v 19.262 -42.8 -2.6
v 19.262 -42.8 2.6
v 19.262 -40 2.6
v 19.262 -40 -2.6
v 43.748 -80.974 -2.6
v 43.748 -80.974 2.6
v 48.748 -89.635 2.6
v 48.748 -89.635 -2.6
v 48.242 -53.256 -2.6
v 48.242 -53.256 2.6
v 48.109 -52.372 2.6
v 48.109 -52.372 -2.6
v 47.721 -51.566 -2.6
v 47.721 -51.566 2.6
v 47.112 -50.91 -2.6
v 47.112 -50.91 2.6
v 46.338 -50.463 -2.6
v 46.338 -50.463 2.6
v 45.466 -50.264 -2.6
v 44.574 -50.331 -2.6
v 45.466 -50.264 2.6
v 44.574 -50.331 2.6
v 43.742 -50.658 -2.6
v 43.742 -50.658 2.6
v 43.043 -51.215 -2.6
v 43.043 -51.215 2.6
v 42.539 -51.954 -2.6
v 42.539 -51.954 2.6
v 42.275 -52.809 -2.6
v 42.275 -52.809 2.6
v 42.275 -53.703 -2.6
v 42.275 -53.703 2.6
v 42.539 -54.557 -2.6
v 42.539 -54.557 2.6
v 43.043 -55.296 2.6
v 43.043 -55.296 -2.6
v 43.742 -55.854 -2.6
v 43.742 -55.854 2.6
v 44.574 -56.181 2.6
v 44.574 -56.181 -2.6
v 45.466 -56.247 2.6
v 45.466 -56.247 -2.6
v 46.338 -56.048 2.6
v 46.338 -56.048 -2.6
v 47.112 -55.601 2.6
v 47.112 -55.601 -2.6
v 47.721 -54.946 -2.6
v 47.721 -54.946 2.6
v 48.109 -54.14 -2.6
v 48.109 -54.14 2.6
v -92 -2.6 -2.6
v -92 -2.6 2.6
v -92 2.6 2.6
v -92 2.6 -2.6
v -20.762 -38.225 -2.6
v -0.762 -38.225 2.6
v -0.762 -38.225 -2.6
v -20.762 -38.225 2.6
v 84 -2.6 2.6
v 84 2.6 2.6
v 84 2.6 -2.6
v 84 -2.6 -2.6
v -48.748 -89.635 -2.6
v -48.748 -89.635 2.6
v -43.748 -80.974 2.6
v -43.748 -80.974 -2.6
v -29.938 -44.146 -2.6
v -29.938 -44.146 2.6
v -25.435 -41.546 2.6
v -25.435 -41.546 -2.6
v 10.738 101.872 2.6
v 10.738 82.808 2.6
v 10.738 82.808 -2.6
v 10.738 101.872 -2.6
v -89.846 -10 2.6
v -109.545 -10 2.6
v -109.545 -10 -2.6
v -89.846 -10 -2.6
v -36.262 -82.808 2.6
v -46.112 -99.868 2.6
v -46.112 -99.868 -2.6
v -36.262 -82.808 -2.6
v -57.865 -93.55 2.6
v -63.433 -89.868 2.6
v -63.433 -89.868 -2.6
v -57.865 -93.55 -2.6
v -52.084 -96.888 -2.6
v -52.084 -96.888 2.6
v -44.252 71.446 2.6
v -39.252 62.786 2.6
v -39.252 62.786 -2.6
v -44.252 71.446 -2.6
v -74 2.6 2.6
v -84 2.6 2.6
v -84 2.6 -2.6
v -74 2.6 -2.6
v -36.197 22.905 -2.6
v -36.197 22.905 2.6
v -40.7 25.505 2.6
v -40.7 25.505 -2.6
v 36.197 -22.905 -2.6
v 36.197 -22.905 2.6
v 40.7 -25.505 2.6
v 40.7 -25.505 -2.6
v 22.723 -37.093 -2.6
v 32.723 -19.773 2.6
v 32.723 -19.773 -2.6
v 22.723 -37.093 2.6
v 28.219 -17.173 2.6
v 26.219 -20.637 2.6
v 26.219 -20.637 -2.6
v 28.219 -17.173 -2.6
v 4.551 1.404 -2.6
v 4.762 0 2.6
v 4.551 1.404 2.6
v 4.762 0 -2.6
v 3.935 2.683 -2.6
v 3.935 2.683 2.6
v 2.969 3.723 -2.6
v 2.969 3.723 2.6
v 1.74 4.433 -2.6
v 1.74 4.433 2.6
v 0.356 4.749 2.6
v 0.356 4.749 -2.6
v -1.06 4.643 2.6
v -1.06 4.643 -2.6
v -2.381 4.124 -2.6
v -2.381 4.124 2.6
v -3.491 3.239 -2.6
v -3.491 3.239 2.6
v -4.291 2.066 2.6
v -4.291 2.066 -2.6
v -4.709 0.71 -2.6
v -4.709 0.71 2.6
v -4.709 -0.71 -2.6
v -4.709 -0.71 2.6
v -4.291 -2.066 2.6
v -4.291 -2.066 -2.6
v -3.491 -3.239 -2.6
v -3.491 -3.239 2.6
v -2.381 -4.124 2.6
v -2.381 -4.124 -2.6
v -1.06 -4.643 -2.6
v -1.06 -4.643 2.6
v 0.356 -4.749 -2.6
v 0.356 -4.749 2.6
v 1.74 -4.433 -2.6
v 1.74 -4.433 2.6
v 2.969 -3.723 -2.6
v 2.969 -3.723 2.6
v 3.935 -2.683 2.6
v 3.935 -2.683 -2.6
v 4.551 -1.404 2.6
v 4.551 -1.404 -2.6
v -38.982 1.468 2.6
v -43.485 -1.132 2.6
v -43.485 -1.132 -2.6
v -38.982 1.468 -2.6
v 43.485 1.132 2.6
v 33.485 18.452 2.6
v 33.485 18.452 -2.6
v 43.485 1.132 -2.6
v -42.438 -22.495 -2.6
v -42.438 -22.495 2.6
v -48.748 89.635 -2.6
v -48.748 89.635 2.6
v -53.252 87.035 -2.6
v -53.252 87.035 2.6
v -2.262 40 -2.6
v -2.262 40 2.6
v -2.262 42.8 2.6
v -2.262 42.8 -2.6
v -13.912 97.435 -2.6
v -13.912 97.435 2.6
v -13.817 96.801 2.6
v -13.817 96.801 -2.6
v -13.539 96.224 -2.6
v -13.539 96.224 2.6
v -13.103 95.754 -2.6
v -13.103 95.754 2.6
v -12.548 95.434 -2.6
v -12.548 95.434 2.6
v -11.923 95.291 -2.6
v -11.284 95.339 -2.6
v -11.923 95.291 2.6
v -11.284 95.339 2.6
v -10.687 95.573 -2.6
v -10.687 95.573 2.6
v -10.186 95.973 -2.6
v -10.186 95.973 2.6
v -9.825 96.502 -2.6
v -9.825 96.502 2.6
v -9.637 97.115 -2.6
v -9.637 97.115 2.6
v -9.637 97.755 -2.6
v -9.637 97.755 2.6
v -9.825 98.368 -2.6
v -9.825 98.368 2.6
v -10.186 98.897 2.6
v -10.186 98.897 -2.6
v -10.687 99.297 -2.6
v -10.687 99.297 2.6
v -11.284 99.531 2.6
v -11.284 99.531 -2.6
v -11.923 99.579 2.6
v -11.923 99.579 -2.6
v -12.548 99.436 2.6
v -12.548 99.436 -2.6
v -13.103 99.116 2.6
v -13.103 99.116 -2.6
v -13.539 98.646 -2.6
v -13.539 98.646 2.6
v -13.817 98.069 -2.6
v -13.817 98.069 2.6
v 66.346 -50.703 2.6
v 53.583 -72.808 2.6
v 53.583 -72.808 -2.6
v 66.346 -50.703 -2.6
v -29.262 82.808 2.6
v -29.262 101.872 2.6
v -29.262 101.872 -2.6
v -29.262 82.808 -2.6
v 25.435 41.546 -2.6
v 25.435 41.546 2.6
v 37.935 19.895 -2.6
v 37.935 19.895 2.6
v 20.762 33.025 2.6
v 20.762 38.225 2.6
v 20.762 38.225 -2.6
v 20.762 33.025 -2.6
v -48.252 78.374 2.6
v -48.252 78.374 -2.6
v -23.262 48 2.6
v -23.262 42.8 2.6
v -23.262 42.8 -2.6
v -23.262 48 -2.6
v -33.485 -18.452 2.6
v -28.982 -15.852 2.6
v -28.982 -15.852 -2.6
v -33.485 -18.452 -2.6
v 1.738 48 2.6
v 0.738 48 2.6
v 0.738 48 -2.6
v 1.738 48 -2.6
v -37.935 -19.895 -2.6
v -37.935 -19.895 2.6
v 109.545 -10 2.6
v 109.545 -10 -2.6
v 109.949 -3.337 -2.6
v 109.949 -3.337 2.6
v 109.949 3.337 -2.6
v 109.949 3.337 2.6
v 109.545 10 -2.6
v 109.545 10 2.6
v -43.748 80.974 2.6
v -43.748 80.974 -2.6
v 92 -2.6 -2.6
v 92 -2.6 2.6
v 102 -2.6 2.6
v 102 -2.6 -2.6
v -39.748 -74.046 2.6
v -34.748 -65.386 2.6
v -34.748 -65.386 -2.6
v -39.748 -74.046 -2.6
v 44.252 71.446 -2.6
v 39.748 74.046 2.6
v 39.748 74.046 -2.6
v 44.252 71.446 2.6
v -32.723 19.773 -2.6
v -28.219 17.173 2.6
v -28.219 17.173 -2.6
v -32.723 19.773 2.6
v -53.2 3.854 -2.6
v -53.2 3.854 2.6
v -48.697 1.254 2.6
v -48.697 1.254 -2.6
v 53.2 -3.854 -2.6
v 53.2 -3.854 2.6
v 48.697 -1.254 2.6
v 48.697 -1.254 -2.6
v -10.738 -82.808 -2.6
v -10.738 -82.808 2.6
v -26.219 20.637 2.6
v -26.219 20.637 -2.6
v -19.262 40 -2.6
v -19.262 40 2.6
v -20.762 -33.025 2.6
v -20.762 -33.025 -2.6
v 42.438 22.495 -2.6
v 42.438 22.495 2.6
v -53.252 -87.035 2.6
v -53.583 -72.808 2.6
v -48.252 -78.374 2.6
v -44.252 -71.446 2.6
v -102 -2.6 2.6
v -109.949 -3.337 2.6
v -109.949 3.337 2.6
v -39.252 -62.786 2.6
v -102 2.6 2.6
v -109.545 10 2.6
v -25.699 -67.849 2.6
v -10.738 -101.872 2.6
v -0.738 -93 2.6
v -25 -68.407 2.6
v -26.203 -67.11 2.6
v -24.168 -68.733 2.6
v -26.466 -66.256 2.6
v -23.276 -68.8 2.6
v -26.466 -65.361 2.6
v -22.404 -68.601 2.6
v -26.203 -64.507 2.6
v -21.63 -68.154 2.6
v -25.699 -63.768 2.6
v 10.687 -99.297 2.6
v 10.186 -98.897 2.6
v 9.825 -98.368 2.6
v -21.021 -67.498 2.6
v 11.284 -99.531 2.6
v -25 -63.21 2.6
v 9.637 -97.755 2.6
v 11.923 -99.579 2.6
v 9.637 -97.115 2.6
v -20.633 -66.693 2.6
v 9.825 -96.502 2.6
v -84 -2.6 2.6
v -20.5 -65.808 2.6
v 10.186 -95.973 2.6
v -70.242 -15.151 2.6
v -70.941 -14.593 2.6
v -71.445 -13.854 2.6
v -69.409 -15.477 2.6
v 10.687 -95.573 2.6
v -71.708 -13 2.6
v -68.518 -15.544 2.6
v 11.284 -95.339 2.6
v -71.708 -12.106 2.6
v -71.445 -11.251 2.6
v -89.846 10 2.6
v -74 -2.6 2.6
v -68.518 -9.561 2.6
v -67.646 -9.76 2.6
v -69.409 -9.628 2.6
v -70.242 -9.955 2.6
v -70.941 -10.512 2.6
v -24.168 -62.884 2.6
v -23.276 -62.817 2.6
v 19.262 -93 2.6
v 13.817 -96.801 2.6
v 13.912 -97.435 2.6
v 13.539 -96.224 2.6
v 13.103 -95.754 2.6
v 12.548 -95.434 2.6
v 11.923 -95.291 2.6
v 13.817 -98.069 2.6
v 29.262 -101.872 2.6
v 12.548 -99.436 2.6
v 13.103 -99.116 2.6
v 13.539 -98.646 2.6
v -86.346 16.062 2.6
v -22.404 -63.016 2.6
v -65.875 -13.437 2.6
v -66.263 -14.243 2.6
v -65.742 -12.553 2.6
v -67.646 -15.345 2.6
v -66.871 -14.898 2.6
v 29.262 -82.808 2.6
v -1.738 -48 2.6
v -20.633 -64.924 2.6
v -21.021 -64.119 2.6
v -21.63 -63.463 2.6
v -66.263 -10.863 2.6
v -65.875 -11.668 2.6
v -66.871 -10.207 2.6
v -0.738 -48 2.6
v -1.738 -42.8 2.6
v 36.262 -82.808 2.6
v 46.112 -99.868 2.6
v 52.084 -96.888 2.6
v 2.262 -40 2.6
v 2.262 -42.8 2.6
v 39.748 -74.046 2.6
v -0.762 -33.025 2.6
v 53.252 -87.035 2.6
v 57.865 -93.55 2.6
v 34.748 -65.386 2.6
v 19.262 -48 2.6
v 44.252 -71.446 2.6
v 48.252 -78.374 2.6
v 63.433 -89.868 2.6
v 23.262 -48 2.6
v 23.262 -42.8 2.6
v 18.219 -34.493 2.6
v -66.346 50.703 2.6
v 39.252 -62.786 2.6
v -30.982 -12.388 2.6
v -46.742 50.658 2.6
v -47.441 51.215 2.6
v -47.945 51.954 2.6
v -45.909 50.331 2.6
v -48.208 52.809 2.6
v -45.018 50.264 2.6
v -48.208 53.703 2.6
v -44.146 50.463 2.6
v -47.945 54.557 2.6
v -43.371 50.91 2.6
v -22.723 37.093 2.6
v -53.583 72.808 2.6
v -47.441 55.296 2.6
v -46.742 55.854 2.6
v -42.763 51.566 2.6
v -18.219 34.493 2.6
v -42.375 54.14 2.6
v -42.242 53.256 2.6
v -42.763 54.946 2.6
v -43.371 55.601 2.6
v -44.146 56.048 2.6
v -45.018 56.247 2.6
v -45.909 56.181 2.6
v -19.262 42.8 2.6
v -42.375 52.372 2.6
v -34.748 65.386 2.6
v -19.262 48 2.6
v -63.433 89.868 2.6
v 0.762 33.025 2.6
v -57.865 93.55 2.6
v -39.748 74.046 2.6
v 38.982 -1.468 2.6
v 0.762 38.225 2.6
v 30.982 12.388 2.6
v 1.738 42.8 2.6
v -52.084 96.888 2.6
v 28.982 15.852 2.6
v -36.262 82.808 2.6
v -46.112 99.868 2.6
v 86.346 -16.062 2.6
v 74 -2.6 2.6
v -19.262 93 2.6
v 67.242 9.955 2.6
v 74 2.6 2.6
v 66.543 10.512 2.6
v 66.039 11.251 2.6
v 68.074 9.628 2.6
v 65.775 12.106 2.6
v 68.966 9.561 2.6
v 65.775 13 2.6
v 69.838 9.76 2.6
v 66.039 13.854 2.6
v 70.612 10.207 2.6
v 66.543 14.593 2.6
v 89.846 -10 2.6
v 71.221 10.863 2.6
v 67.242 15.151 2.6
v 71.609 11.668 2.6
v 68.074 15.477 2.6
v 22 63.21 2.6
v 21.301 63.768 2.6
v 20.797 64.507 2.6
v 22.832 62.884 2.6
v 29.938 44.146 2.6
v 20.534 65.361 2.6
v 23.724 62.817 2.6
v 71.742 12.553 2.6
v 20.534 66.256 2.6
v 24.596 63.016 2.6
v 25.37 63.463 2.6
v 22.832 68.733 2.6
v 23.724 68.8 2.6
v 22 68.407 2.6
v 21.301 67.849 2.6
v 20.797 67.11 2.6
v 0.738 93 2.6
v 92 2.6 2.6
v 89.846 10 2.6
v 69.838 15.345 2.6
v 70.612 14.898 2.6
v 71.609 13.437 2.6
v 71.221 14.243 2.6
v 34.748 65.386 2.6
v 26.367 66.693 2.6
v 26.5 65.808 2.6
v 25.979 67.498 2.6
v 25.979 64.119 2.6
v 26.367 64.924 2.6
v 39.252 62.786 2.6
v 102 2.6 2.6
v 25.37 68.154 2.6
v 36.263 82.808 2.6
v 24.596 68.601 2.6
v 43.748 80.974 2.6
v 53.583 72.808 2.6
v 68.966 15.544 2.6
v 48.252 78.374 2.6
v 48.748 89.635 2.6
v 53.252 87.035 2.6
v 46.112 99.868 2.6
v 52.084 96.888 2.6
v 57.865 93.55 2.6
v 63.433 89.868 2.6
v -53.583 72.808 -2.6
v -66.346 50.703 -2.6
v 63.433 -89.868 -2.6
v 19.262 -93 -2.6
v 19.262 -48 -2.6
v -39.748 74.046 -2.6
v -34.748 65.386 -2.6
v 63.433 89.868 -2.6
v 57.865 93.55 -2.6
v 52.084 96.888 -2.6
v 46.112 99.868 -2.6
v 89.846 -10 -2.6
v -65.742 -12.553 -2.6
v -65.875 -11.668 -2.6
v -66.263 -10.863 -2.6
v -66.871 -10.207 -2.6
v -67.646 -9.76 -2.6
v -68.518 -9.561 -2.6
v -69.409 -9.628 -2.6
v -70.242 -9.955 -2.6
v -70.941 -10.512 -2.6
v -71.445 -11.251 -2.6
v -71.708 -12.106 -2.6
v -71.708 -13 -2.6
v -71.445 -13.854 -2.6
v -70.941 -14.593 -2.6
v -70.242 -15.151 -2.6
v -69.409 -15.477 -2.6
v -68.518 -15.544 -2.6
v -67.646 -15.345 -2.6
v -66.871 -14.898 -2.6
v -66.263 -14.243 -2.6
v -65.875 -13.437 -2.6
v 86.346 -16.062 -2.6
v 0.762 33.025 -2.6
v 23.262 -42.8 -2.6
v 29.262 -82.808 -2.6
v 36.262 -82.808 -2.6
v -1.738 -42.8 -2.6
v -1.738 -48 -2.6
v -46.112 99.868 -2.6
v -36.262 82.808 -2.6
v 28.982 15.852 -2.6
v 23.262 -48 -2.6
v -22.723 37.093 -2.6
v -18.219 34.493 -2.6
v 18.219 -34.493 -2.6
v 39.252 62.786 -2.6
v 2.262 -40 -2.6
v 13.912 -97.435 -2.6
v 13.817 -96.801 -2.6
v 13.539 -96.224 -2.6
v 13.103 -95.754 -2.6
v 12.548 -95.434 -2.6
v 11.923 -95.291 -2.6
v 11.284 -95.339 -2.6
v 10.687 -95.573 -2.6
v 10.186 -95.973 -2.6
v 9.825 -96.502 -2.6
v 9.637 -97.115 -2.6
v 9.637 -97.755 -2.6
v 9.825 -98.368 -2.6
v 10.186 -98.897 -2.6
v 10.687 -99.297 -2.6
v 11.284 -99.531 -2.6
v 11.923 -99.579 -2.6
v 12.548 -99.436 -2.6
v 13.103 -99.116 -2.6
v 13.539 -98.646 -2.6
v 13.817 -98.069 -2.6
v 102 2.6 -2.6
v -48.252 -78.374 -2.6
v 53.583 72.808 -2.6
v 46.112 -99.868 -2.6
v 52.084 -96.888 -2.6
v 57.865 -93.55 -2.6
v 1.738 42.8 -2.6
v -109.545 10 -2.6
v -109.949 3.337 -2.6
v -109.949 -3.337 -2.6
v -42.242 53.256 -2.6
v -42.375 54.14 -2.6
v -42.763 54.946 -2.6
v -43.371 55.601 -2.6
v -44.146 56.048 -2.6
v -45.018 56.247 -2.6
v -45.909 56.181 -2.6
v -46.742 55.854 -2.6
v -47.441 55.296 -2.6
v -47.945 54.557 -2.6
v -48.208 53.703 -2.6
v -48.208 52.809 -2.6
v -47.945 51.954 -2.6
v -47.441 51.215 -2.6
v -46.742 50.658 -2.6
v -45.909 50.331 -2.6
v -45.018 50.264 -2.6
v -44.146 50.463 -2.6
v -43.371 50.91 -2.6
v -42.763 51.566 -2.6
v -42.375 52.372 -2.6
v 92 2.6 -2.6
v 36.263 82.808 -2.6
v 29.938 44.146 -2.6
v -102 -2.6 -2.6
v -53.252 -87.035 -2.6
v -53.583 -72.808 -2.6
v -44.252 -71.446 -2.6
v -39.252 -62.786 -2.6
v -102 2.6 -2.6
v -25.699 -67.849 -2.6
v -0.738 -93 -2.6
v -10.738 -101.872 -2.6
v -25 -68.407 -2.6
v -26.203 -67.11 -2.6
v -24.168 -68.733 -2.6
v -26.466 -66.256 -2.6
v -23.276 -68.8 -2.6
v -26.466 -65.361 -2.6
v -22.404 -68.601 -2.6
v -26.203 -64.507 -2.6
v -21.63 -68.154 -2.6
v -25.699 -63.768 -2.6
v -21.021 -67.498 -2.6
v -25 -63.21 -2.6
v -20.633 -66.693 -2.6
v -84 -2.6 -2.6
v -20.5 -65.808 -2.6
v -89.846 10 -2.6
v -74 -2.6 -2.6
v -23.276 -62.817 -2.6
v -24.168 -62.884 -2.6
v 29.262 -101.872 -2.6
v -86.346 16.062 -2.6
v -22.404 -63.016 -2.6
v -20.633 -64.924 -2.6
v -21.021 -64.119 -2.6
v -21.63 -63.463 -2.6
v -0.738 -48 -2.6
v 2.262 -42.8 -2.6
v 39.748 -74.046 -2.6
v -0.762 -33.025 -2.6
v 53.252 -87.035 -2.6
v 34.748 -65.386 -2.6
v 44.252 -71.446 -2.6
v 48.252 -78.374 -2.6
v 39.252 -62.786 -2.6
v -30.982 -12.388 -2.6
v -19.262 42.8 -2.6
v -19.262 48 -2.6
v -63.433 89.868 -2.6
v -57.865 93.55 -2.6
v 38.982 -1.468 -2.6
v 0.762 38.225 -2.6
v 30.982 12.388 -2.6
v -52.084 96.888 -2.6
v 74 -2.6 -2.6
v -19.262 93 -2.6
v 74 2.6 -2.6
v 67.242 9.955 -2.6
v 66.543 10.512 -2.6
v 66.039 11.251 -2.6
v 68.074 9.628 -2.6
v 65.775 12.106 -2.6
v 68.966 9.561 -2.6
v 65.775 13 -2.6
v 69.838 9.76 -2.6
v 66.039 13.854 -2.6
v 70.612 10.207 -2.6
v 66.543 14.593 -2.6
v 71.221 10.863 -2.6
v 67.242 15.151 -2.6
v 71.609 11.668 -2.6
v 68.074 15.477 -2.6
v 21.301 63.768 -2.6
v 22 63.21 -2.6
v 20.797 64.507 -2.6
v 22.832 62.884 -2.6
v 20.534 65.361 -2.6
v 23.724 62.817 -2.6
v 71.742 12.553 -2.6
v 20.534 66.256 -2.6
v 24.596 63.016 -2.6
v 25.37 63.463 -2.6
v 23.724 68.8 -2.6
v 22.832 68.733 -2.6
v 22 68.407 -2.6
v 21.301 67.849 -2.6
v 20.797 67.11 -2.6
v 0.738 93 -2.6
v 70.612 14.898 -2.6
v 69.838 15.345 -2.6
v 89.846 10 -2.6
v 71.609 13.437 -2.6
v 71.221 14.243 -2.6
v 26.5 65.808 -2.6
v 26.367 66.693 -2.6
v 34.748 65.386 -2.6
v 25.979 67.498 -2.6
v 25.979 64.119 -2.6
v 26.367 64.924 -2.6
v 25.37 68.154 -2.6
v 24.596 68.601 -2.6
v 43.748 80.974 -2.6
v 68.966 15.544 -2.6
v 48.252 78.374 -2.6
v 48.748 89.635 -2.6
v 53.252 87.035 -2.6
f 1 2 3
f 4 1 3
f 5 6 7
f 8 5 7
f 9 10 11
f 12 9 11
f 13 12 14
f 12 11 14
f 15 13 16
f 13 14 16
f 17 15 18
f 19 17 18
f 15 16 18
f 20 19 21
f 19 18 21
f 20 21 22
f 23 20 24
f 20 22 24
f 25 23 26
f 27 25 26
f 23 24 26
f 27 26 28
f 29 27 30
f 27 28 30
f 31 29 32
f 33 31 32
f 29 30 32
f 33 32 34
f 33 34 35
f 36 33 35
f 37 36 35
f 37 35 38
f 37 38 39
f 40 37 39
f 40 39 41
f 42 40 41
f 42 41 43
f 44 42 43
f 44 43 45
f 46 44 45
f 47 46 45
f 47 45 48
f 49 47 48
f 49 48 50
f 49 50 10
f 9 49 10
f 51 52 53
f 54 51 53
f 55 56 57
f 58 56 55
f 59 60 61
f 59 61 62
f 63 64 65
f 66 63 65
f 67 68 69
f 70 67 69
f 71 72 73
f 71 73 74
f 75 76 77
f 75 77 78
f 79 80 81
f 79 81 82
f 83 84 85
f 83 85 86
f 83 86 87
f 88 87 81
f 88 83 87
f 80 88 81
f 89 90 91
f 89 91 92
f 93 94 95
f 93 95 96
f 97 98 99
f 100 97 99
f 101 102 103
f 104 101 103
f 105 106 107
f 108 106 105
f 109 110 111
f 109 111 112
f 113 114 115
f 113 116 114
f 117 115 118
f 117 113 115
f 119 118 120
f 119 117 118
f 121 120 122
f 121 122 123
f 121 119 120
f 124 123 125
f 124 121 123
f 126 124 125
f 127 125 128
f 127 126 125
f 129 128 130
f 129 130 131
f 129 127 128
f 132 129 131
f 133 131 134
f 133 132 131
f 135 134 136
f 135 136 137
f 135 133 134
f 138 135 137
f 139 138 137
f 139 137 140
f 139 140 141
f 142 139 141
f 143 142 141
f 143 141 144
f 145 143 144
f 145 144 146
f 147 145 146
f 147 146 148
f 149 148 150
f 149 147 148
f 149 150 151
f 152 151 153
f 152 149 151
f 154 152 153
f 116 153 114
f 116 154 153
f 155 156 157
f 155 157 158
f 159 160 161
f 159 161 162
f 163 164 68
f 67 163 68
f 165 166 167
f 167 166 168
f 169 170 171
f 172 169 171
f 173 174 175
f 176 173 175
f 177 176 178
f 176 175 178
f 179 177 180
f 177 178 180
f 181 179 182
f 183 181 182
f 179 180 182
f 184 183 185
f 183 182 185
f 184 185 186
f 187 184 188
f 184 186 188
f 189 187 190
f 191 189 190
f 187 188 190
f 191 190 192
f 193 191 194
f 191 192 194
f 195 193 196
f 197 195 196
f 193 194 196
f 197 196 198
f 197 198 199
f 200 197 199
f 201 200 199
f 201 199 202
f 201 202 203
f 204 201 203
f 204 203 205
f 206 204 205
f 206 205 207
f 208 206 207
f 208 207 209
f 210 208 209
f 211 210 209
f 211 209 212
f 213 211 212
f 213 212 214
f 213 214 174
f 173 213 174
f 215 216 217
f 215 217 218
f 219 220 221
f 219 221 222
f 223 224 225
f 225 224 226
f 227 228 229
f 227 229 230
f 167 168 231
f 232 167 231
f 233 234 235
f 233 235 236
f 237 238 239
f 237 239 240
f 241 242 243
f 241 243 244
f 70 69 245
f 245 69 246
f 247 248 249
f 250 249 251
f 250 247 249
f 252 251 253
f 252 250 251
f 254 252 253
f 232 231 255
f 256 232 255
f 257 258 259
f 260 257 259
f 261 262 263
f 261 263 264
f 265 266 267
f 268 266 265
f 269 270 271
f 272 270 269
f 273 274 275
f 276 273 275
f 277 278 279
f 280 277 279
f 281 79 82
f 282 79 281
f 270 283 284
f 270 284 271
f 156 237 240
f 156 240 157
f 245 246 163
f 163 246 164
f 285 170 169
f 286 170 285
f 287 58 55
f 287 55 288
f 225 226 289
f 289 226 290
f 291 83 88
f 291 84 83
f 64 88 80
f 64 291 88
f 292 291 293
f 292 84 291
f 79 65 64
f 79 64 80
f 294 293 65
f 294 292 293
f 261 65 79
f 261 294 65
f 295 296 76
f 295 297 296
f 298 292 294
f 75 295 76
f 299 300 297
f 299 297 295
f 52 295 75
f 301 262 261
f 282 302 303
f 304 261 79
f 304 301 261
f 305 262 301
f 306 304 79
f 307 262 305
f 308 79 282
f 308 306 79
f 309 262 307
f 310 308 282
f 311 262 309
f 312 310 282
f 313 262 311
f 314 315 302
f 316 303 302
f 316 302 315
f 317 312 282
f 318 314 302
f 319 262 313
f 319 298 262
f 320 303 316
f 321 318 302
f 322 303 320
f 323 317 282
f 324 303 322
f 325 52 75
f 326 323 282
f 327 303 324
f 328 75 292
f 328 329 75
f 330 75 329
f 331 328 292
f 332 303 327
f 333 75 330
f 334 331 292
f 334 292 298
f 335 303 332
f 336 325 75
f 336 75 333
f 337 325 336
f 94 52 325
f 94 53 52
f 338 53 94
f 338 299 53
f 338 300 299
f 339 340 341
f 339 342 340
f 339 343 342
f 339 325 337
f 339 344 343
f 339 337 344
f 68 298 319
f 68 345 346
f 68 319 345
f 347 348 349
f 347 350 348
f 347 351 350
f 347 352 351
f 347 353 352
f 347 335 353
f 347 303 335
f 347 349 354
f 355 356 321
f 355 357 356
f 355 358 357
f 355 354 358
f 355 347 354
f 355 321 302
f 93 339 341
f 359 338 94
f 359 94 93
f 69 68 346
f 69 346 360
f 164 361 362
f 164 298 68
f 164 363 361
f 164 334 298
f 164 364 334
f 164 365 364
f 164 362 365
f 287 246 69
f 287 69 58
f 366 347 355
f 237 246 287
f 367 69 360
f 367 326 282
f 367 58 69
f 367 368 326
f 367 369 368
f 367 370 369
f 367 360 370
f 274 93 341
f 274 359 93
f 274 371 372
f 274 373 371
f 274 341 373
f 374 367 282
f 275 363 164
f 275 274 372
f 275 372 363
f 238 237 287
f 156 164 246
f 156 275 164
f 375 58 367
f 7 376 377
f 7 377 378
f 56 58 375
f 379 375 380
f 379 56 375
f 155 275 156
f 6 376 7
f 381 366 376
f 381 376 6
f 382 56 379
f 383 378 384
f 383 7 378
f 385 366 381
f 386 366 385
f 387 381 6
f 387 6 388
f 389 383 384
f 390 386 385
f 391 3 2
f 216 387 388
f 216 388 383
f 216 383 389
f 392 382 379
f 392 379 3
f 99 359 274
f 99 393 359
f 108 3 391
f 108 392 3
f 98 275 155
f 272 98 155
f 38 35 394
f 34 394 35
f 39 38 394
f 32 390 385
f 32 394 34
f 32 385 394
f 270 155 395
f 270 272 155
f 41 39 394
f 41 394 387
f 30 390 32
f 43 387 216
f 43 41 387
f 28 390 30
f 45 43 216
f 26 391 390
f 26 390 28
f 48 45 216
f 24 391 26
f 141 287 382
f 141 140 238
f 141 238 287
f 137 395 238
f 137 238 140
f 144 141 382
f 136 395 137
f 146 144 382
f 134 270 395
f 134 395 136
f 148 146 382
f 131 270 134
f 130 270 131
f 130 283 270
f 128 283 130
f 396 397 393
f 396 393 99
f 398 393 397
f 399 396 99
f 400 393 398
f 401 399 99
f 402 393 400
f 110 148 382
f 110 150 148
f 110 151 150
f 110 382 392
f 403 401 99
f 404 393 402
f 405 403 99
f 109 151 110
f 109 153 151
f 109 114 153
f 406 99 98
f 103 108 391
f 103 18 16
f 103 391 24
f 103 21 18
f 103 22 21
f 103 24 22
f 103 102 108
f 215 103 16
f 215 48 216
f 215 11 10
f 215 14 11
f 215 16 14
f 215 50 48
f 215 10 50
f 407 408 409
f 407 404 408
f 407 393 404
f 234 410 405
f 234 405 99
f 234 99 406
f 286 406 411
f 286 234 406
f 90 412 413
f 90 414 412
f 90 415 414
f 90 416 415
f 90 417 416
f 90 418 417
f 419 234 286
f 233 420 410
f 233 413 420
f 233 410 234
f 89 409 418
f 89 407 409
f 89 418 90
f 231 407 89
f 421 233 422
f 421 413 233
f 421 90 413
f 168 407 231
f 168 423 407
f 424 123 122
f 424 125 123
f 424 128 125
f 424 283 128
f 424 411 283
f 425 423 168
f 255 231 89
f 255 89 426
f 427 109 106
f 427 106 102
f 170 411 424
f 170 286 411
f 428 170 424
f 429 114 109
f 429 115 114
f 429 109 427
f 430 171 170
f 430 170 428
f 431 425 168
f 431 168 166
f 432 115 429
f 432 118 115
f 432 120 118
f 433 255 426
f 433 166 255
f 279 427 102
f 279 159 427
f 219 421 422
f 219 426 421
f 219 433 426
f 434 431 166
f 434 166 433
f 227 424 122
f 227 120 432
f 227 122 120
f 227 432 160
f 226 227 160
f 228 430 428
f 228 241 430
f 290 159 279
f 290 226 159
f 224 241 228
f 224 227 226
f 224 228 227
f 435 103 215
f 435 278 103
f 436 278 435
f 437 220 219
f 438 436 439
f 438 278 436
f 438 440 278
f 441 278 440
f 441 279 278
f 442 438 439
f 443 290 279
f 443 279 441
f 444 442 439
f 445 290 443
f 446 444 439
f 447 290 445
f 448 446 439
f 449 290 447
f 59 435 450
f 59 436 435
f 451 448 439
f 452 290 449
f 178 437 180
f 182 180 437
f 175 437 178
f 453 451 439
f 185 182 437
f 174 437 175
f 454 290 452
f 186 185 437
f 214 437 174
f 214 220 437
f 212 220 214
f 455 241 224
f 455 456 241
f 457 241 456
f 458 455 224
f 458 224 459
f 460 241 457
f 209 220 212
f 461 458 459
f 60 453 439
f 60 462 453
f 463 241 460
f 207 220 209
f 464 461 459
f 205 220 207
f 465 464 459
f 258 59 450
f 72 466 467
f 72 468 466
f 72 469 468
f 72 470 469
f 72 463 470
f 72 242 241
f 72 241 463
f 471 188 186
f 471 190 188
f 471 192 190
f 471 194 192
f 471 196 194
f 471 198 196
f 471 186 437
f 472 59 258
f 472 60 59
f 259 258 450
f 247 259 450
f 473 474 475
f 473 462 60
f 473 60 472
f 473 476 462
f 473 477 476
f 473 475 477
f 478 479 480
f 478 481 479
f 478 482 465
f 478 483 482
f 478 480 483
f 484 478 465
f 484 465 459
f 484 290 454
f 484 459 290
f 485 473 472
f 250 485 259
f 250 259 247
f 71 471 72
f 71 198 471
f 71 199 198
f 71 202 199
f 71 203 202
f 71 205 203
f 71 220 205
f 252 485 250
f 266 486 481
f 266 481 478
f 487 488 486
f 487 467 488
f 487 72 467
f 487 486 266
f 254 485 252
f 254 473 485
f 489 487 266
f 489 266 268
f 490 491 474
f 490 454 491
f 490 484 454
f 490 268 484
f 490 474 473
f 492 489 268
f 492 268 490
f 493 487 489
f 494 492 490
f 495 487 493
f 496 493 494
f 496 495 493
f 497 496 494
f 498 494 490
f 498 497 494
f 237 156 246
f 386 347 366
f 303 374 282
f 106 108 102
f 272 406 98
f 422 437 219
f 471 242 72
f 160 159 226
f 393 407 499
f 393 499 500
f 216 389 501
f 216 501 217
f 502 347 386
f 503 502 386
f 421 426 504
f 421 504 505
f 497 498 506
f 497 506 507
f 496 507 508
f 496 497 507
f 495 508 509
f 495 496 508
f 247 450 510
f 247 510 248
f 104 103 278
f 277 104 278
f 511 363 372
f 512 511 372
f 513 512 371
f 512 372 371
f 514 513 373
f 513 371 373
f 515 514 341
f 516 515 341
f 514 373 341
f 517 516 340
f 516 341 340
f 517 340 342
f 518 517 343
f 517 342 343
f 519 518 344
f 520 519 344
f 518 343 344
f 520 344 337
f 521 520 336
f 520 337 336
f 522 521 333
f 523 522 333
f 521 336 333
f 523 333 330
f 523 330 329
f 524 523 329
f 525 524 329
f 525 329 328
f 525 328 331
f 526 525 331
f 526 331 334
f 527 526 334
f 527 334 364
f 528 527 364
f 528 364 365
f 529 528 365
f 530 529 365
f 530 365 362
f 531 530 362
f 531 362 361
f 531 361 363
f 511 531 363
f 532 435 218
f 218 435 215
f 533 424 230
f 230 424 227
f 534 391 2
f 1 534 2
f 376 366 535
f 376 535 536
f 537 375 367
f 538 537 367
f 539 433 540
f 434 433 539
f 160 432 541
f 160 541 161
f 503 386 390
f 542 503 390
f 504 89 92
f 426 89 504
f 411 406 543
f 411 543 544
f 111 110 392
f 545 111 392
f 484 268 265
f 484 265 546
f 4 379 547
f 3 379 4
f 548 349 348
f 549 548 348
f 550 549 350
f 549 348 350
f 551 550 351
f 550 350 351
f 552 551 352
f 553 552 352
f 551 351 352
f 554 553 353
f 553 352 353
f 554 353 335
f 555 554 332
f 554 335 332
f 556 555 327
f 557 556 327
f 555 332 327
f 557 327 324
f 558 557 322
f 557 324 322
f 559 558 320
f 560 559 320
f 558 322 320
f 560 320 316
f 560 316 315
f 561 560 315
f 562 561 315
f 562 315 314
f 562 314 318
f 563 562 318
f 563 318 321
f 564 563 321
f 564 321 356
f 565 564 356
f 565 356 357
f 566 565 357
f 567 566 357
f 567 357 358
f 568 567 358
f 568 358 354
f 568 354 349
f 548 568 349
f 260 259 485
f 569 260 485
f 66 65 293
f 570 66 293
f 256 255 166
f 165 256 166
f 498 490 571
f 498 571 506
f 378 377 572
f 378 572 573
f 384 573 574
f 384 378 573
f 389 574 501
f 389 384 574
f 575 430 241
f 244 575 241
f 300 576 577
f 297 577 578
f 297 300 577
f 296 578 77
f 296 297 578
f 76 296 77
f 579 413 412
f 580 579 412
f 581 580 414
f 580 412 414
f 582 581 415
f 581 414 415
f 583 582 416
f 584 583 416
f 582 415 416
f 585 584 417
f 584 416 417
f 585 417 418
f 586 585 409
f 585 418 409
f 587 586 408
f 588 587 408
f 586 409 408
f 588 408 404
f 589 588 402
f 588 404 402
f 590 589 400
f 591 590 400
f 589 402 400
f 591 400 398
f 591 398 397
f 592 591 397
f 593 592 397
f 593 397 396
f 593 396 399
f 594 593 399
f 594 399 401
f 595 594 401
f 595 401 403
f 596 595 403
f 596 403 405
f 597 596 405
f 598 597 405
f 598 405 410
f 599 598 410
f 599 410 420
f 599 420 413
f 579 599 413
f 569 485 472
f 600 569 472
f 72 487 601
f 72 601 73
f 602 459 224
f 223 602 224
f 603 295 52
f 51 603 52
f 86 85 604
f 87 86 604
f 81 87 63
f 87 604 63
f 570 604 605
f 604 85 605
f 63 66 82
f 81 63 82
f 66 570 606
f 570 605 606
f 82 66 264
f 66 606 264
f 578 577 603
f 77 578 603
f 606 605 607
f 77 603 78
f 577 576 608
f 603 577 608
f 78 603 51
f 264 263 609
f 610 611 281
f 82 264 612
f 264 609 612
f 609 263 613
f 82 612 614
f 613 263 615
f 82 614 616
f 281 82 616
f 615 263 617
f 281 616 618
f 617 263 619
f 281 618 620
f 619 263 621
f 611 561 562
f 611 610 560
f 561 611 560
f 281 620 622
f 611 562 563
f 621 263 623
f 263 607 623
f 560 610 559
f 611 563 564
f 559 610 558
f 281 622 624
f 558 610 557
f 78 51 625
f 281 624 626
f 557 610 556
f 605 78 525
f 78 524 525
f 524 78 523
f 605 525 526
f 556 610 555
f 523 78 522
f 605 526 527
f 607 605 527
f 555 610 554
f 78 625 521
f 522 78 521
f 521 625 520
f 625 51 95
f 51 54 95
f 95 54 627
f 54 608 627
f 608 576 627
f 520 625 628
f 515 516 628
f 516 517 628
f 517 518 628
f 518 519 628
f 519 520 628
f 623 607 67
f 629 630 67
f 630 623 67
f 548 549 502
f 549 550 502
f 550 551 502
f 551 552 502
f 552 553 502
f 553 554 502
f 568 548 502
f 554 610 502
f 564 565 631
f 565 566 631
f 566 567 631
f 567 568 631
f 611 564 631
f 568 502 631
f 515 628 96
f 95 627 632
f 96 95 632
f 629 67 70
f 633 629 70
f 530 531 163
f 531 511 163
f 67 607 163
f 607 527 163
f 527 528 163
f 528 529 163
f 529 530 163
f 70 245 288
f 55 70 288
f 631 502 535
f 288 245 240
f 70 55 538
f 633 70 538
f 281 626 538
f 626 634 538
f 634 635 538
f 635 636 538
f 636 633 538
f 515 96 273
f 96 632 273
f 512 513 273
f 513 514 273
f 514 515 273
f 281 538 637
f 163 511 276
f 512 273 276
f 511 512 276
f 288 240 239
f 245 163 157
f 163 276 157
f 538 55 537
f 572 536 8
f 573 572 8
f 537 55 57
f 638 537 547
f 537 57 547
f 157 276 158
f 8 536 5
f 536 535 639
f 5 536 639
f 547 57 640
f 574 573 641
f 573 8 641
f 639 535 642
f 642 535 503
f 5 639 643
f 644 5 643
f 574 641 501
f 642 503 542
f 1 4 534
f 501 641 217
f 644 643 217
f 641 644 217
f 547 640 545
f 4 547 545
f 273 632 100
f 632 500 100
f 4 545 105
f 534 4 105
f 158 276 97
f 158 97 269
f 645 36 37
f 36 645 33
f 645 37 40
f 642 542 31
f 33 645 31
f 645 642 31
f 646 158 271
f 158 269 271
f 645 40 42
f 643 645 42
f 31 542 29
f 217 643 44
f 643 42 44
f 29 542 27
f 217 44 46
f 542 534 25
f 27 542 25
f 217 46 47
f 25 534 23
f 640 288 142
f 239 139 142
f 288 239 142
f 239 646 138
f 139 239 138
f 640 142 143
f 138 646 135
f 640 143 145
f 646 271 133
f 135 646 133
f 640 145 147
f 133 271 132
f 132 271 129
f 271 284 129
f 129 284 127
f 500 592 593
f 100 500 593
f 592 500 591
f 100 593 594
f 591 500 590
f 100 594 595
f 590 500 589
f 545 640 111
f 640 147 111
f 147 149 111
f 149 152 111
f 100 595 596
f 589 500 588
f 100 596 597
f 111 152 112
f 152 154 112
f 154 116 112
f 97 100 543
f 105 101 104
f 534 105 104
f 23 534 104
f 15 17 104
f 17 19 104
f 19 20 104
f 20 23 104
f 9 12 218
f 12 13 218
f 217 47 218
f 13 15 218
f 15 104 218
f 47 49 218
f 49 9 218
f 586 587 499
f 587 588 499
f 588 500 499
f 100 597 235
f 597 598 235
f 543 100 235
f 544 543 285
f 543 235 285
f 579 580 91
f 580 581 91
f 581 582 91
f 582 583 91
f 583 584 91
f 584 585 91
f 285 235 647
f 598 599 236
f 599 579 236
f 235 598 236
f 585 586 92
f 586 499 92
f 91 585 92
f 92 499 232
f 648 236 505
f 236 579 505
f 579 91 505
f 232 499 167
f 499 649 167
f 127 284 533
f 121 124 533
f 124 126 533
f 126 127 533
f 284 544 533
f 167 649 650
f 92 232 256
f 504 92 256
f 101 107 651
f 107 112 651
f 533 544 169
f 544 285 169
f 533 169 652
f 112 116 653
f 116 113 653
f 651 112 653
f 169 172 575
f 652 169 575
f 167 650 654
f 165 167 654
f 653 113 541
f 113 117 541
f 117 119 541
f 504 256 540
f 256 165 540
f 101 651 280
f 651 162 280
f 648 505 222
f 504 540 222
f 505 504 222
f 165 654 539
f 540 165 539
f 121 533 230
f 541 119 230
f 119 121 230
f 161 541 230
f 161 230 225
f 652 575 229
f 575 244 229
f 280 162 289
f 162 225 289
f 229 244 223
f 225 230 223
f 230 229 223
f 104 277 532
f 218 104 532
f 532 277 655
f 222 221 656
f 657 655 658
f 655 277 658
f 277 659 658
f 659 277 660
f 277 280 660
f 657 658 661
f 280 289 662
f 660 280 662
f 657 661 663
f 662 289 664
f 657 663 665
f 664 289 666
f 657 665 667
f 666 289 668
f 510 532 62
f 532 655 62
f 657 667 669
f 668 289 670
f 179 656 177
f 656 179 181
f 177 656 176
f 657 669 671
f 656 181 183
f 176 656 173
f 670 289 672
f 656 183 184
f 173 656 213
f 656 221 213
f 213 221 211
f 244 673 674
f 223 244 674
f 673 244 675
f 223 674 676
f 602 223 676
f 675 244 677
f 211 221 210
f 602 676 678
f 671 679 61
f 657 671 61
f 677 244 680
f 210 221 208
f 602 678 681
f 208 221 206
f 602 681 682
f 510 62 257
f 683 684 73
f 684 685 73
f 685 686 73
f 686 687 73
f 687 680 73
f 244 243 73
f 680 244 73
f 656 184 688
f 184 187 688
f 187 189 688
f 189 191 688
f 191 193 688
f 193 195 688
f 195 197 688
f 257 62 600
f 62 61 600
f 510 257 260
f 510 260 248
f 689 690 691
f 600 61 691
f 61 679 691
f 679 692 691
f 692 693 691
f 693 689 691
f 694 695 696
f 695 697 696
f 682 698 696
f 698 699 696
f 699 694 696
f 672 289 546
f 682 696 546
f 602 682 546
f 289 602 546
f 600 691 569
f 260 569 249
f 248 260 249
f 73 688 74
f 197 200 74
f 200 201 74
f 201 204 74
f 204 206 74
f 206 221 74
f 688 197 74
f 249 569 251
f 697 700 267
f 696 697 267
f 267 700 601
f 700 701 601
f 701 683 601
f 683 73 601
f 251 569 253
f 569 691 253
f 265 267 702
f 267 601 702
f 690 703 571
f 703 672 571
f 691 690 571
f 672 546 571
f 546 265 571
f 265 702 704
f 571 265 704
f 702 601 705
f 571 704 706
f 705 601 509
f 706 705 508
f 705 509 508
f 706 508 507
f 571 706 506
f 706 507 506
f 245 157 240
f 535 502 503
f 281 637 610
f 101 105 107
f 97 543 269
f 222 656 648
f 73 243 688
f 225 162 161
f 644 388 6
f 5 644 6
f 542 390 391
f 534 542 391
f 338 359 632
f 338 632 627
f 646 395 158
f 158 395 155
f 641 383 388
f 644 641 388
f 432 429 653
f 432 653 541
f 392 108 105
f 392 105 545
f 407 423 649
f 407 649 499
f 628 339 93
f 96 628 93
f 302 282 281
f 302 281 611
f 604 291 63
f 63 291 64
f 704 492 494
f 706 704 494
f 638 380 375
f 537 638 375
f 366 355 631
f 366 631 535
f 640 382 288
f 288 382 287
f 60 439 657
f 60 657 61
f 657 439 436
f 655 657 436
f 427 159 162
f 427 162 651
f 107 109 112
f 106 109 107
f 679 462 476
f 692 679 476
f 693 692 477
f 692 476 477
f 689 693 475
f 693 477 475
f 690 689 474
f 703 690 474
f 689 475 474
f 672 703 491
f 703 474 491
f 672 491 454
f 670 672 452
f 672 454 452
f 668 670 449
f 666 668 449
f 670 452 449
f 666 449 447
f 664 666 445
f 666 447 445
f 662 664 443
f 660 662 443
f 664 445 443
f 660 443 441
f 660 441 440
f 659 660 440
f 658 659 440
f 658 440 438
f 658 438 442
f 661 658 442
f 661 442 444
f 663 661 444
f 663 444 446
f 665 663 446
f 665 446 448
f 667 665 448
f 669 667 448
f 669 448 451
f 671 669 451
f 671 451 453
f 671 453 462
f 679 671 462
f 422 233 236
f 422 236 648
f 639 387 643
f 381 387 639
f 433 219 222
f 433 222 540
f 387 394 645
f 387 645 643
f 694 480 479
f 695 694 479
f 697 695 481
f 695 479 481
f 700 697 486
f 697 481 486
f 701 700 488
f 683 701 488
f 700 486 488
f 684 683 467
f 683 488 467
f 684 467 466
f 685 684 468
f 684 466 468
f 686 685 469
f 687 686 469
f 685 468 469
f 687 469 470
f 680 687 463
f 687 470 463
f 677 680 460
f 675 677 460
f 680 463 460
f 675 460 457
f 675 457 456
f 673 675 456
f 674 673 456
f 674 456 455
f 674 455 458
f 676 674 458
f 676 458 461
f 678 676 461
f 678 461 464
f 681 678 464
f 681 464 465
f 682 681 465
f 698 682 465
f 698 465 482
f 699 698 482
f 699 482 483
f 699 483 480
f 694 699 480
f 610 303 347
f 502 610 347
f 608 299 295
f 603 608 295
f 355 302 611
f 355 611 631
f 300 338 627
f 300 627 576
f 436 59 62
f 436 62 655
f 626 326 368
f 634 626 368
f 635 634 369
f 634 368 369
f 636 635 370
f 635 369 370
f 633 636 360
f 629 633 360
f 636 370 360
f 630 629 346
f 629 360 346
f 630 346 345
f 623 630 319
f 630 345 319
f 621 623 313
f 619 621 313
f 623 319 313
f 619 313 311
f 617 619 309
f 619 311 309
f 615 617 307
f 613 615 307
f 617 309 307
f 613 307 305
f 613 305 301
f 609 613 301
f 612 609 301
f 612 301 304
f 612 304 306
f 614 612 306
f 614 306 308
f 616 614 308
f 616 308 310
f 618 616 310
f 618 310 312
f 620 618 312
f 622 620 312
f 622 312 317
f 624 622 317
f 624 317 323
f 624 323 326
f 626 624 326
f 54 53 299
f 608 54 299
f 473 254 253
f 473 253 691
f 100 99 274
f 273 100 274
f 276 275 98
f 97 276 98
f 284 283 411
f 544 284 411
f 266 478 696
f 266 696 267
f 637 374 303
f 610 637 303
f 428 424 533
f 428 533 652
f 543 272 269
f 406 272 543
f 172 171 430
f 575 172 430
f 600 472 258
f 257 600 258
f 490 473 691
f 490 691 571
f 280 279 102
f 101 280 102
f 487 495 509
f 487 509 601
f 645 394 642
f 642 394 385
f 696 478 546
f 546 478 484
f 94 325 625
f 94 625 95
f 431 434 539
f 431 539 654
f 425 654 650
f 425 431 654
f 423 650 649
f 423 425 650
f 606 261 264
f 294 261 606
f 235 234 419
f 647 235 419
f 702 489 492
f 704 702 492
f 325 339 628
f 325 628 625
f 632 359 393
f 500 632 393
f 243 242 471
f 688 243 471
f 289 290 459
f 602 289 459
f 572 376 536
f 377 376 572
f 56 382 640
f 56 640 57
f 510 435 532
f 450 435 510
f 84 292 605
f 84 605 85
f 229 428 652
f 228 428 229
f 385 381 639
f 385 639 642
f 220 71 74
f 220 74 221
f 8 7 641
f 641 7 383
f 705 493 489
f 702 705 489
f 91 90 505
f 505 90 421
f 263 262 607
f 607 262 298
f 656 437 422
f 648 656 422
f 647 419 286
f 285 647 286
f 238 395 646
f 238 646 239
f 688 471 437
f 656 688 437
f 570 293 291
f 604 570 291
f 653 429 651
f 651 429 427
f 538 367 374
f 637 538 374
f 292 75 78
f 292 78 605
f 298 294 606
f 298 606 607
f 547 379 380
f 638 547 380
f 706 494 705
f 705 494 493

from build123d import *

# Parameters (mm, degrees)
SKETCH1_R                   = 110
SKETCH1_R_2                 = 4.7625
BOSS_EXTRUDE1_DEPTH         = 2.6
SKETCH2_R                   = 2.15
CUT_EXTRUDE3_DEPTH          = 6.2
CIRPATTERN1_COUNT           = 2
CIRPATTERN2_COUNT           = 2
CIRPATTERN2_ANGLE           = 60
CIRPATTERN2_COPY_1_SKETCH_R = 2.15
CIRPATTERN2_COPY_1_DEPTH    = 6.2
CUT_EXTRUDE5_DEPTH          = 6.2
SKETCH11_R                  = 3
SKETCH11_W                  = 25
SKETCH11_H                  = 5.2
CUT_EXTRUDE24_DEPTH         = 6.2
CUT_EXTRUDE25_DEPTH         = 6.2
CUT_EXTRUDE26_DEPTH         = 6.2


with BuildPart() as part:
    # Sketch1 → Boss-Extrude1 (new body, symmetric)
    with BuildSketch(Plane.XY):
        Circle(SKETCH1_R)
        Circle(SKETCH1_R_2, mode=Mode.SUBTRACT)
        Polygon((-4.7625, 40), (-2.2625, 40), (-2.2625, 48), (0.7375, 48), (0.7375, 93), (-19.2625, 93), (-19.2625, 40), (-16.7625, 40), align=None, mode=Mode.SUBTRACT)
        Polygon((4.7625, -40), (2.2625, -40), (2.2625, -48), (-0.7375, -48), (-0.7375, -93), (19.2625, -93), (19.2625, -40), (16.7625, -40), align=None, mode=Mode.SUBTRACT)
    extrude(amount=BOSS_EXTRUDE1_DEPTH, both=True)

    # Sketch2 → Cut-Extrude3 (cut, through all)
    with BuildSketch(Plane.XY.offset(2.6)):
        with Locations((11.7625, -97.435)):
            Circle(SKETCH2_R)
        with BuildLine():
            Line((-10.7375, -82.808492409), (-10.7375, -101.8725))
            Line((-10.7375, -101.8725), (9.2625, -101.8725))
            Line((9.2625, -101.8725), (29.2625, -101.8725))
            Line((29.2625, -101.8725), (29.2625, -82.808492409))
            Line((29.2625, -82.808492409), (36.2625, -82.808492409))
            Line((36.2625, -82.808492409), (46.112001713, -99.868329805))
            ThreePointArc((46.112001713, -99.868329805), (0, -110), (-46.112001713, -99.868329805))
            Line((-46.112001713, -99.868329805), (-36.2625, -82.808492409))
            Line((-36.2625, -82.808492409), (-10.7375, -82.808492409))
        make_face()
    cut_extrude3 = extrude(amount=-CUT_EXTRUDE3_DEPTH, mode=Mode.SUBTRACT)

    # CirPattern1: Cut-Extrude3 ×2 about axis
    cirpattern1_axis = Axis((0, 0, 0), (0, 0, 1))
    for i in range(1, CIRPATTERN1_COUNT):
        add(cut_extrude3.rotate(cirpattern1_axis, i * 360 / CIRPATTERN1_COUNT), mode=Mode.SUBTRACT)

    # CirPattern2: Cut-Extrude3 ×2 about axis
    cirpattern2_axis = Axis((0, 0, 0), (0, 0, 1))
    for i in range(1, CIRPATTERN2_COUNT):
        add(cut_extrude3.rotate(cirpattern2_axis, i * CIRPATTERN2_ANGLE / (CIRPATTERN2_COUNT - 1)), mode=Mode.SUBTRACT)

    # CirPattern2 copy 1 sketch → CirPattern2 copy 1 (cut, through all)
    with BuildSketch(Plane(origin=(0, 0, 2.6), x_dir=(-0.5, -0.866025404, 0), z_dir=(0, 0, 1))):
        with Locations((11.7625, -97.435)):
            Circle(CIRPATTERN2_COPY_1_SKETCH_R)
        with BuildLine():
            Line((-10.7375, -82.808492409), (-10.7375, -101.8725))
            Line((-10.7375, -101.8725), (9.2625, -101.8725))
            Line((9.2625, -101.8725), (29.2625, -101.8725))
            Line((29.2625, -101.8725), (29.2625, -82.808492409))
            Line((29.2625, -82.808492409), (36.2625, -82.808492409))
            Line((36.2625, -82.808492409), (46.112001713, -99.868329805))
            ThreePointArc((46.112001713, -99.868329805), (0, -110), (-46.112001713, -99.868329805))
            Line((-46.112001713, -99.868329805), (-36.2625, -82.808492409))
            Line((-36.2625, -82.808492409), (-10.7375, -82.808492409))
        make_face()
    extrude(amount=-CIRPATTERN2_COPY_1_DEPTH, mode=Mode.SUBTRACT)

    # Sketch5 → Cut-Extrude5 (cut, through all)
    with BuildSketch(Plane.XY.offset(2.6)):
        with BuildLine():
            Line((89.845508076, 10), (53.583008076, 72.808492409))
            Line((53.583008076, 72.808492409), (63.432509788, 89.868329805))
            ThreePointArc((63.432509788, 89.868329805), (95.262794416, 55), (109.544511501, 10))
            Line((109.544511501, 10), (89.845508076, 10))
        make_face()
        with BuildLine():
            Line((-89.845508076, -10), (-53.583008076, -72.808492409))
            Line((-53.583008076, -72.808492409), (-63.432509788, -89.868329805))
            ThreePointArc((-63.432509788, -89.868329805), (-95.262794416, -55), (-109.544511501, -10))
            Line((-109.544511501, -10), (-89.845508076, -10))
        make_face()
    extrude(amount=-CUT_EXTRUDE5_DEPTH, mode=Mode.SUBTRACT)

    # Sketch11 → Cut-Extrude24 (cut, through all)
    with BuildSketch(Plane.XY.offset(2.6)):
        with Locations((45.241826211, -53.255843194)):
            Circle(SKETCH11_R)
        with Locations((-23.5, -65.808492409)):
            Circle(SKETCH11_R)
        with Locations((-68.741826211, -12.552649216)):
            Circle(SKETCH11_R)
        with Locations((-45.241826211, 53.255843194)):
            Circle(SKETCH11_R)
        with Locations((23.5, 65.808492409)):
            Circle(SKETCH11_R)
        with Locations((68.741826211, 12.552649216)):
            Circle(SKETCH11_R)
        Polygon((-1.7375, -48), (23.2625, -48), (23.2625, -42.8), (19.2625, -42.8), (2.2625, -42.8), (-1.7375, -42.8), align=None)
        Polygon((-42.437969382, -22.495280861), (-29.937969382, -44.145915956), (-25.434637282, -41.545915956), (-37.934637282, -19.895280861), align=None)
        Polygon((-20.7625, -33.025), (-16.7625, -33.025), (-4.7625, -33.025), (-0.7625, -33.025), (-0.7625, -38.225), (-20.7625, -38.225), align=None)
        Polygon((-38.98173896, 1.468352446), (-36.98173896, -1.995749169), (-30.98173896, -12.388054014), (-28.98173896, -15.85215563), (-33.48507106, -18.45215563), (-43.48507106, -1.131647554), align=None)
        Polygon((-40.700469382, 25.504719139), (-53.200469382, 3.854084044), (-48.697137282, 1.254084044), (-36.197137282, 22.904719139), align=None)
        Polygon((-18.21923896, 34.493352446), (-20.21923896, 31.029250831), (-26.21923896, 20.636945986), (-28.21923896, 17.17284437), (-32.72257106, 19.77284437), (-22.72257106, 37.093352446), align=None)
        with Locations((-10.7625, 45.4)):
            Rectangle(SKETCH11_W, SKETCH11_H)
        Polygon((42.437969382, 22.495280861), (29.937969382, 44.145915956), (25.434637282, 41.545915956), (37.934637282, 19.895280861), align=None)
        Polygon((20.7625, 33.025), (16.7625, 33.025), (4.7625, 33.025), (0.7625, 33.025), (0.7625, 38.225), (20.7625, 38.225), align=None)
        Polygon((40.700469382, -25.504719139), (53.200469382, -3.854084044), (48.697137282, -1.254084044), (36.197137282, -22.904719139), align=None)
        Polygon((38.98173896, -1.468352446), (36.98173896, 1.995749169), (30.98173896, 12.388054014), (28.98173896, 15.85215563), (33.48507106, 18.45215563), (43.48507106, 1.131647554), align=None)
        Polygon((18.21923896, -34.493352446), (20.21923896, -31.029250831), (26.21923896, -20.636945986), (28.21923896, -17.17284437), (32.72257106, -19.77284437), (22.72257106, -37.093352446), align=None)
    extrude(amount=-CUT_EXTRUDE24_DEPTH, mode=Mode.SUBTRACT)

    # Sketch12 → Cut-Extrude25 (cut, through all)
    with BuildSketch(Plane.XY.offset(2.6)):
        Polygon((-37, -64.08587988), (-34.74833395, -65.38587988), (-39.74833395, -74.046133918), (-44.25166605, -71.446133918), (-39.25166605, -62.78587988), align=None)
        Polygon((-51, -88.334591186), (-48.74833395, -89.634591186), (-43.74833395, -80.974337148), (-48.25166605, -78.374337148), (-53.25166605, -87.034591186), align=None)
        Polygon((-74, 0), (-74, -2.6), (-84, -2.6), (-84, 2.6), (-74, 2.6), align=None)
        Polygon((-102, 0), (-102, -2.6), (-92, -2.6), (-92, 2.6), (-102, 2.6), align=None)
        Polygon((-37, 64.08587988), (-39.25166605, 62.78587988), (-44.25166605, 71.446133918), (-39.74833395, 74.046133918), (-34.74833395, 65.38587988), align=None)
        Polygon((-51, 88.334591186), (-53.25166605, 87.034591186), (-48.25166605, 78.374337148), (-43.74833395, 80.974337148), (-48.74833395, 89.634591186), align=None)
        Polygon((37, 64.08587988), (34.74833395, 65.38587988), (39.74833395, 74.046133918), (44.25166605, 71.446133918), (39.25166605, 62.78587988), align=None)
        Polygon((51, 88.334591186), (48.74833395, 89.634591186), (43.74833395, 80.974337148), (48.25166605, 78.374337148), (53.25166605, 87.034591186), align=None)
        Polygon((74, 0), (74, 2.6), (84, 2.6), (84, -2.6), (74, -2.6), align=None)
        Polygon((102, 0), (102, 2.6), (92, 2.6), (92, -2.6), (102, -2.6), align=None)
        Polygon((37, -64.08587988), (39.25166605, -62.78587988), (44.25166605, -71.446133918), (39.74833395, -74.046133918), (34.74833395, -65.38587988), align=None)
        Polygon((51, -88.334591186), (53.25166605, -87.034591186), (48.25166605, -78.374337148), (43.74833395, -80.974337148), (48.74833395, -89.634591186), align=None)
    extrude(amount=-CUT_EXTRUDE25_DEPTH, mode=Mode.SUBTRACT)

    # Sketch13 → Cut-Extrude26 (cut, through all)
    with BuildSketch(Plane.XY.offset(2.6)):
        Polygon((-86.345508076, 16.062177826), (-66.345508076, 50.703193978), (-76.345508076, 67.59574596), (-92.560678517, 57.996740162), (-113.304387557, 22.067582168), align=None)
        Polygon((66.345508076, -50.703193978), (83.10535709, -79.014856047), (116.539469578, -32.259052148), (108.045386829, -17.910378712), (86.345508076, -16.062177826), align=None)
    extrude(amount=-CUT_EXTRUDE26_DEPTH, mode=Mode.SUBTRACT)


solid = part.part
